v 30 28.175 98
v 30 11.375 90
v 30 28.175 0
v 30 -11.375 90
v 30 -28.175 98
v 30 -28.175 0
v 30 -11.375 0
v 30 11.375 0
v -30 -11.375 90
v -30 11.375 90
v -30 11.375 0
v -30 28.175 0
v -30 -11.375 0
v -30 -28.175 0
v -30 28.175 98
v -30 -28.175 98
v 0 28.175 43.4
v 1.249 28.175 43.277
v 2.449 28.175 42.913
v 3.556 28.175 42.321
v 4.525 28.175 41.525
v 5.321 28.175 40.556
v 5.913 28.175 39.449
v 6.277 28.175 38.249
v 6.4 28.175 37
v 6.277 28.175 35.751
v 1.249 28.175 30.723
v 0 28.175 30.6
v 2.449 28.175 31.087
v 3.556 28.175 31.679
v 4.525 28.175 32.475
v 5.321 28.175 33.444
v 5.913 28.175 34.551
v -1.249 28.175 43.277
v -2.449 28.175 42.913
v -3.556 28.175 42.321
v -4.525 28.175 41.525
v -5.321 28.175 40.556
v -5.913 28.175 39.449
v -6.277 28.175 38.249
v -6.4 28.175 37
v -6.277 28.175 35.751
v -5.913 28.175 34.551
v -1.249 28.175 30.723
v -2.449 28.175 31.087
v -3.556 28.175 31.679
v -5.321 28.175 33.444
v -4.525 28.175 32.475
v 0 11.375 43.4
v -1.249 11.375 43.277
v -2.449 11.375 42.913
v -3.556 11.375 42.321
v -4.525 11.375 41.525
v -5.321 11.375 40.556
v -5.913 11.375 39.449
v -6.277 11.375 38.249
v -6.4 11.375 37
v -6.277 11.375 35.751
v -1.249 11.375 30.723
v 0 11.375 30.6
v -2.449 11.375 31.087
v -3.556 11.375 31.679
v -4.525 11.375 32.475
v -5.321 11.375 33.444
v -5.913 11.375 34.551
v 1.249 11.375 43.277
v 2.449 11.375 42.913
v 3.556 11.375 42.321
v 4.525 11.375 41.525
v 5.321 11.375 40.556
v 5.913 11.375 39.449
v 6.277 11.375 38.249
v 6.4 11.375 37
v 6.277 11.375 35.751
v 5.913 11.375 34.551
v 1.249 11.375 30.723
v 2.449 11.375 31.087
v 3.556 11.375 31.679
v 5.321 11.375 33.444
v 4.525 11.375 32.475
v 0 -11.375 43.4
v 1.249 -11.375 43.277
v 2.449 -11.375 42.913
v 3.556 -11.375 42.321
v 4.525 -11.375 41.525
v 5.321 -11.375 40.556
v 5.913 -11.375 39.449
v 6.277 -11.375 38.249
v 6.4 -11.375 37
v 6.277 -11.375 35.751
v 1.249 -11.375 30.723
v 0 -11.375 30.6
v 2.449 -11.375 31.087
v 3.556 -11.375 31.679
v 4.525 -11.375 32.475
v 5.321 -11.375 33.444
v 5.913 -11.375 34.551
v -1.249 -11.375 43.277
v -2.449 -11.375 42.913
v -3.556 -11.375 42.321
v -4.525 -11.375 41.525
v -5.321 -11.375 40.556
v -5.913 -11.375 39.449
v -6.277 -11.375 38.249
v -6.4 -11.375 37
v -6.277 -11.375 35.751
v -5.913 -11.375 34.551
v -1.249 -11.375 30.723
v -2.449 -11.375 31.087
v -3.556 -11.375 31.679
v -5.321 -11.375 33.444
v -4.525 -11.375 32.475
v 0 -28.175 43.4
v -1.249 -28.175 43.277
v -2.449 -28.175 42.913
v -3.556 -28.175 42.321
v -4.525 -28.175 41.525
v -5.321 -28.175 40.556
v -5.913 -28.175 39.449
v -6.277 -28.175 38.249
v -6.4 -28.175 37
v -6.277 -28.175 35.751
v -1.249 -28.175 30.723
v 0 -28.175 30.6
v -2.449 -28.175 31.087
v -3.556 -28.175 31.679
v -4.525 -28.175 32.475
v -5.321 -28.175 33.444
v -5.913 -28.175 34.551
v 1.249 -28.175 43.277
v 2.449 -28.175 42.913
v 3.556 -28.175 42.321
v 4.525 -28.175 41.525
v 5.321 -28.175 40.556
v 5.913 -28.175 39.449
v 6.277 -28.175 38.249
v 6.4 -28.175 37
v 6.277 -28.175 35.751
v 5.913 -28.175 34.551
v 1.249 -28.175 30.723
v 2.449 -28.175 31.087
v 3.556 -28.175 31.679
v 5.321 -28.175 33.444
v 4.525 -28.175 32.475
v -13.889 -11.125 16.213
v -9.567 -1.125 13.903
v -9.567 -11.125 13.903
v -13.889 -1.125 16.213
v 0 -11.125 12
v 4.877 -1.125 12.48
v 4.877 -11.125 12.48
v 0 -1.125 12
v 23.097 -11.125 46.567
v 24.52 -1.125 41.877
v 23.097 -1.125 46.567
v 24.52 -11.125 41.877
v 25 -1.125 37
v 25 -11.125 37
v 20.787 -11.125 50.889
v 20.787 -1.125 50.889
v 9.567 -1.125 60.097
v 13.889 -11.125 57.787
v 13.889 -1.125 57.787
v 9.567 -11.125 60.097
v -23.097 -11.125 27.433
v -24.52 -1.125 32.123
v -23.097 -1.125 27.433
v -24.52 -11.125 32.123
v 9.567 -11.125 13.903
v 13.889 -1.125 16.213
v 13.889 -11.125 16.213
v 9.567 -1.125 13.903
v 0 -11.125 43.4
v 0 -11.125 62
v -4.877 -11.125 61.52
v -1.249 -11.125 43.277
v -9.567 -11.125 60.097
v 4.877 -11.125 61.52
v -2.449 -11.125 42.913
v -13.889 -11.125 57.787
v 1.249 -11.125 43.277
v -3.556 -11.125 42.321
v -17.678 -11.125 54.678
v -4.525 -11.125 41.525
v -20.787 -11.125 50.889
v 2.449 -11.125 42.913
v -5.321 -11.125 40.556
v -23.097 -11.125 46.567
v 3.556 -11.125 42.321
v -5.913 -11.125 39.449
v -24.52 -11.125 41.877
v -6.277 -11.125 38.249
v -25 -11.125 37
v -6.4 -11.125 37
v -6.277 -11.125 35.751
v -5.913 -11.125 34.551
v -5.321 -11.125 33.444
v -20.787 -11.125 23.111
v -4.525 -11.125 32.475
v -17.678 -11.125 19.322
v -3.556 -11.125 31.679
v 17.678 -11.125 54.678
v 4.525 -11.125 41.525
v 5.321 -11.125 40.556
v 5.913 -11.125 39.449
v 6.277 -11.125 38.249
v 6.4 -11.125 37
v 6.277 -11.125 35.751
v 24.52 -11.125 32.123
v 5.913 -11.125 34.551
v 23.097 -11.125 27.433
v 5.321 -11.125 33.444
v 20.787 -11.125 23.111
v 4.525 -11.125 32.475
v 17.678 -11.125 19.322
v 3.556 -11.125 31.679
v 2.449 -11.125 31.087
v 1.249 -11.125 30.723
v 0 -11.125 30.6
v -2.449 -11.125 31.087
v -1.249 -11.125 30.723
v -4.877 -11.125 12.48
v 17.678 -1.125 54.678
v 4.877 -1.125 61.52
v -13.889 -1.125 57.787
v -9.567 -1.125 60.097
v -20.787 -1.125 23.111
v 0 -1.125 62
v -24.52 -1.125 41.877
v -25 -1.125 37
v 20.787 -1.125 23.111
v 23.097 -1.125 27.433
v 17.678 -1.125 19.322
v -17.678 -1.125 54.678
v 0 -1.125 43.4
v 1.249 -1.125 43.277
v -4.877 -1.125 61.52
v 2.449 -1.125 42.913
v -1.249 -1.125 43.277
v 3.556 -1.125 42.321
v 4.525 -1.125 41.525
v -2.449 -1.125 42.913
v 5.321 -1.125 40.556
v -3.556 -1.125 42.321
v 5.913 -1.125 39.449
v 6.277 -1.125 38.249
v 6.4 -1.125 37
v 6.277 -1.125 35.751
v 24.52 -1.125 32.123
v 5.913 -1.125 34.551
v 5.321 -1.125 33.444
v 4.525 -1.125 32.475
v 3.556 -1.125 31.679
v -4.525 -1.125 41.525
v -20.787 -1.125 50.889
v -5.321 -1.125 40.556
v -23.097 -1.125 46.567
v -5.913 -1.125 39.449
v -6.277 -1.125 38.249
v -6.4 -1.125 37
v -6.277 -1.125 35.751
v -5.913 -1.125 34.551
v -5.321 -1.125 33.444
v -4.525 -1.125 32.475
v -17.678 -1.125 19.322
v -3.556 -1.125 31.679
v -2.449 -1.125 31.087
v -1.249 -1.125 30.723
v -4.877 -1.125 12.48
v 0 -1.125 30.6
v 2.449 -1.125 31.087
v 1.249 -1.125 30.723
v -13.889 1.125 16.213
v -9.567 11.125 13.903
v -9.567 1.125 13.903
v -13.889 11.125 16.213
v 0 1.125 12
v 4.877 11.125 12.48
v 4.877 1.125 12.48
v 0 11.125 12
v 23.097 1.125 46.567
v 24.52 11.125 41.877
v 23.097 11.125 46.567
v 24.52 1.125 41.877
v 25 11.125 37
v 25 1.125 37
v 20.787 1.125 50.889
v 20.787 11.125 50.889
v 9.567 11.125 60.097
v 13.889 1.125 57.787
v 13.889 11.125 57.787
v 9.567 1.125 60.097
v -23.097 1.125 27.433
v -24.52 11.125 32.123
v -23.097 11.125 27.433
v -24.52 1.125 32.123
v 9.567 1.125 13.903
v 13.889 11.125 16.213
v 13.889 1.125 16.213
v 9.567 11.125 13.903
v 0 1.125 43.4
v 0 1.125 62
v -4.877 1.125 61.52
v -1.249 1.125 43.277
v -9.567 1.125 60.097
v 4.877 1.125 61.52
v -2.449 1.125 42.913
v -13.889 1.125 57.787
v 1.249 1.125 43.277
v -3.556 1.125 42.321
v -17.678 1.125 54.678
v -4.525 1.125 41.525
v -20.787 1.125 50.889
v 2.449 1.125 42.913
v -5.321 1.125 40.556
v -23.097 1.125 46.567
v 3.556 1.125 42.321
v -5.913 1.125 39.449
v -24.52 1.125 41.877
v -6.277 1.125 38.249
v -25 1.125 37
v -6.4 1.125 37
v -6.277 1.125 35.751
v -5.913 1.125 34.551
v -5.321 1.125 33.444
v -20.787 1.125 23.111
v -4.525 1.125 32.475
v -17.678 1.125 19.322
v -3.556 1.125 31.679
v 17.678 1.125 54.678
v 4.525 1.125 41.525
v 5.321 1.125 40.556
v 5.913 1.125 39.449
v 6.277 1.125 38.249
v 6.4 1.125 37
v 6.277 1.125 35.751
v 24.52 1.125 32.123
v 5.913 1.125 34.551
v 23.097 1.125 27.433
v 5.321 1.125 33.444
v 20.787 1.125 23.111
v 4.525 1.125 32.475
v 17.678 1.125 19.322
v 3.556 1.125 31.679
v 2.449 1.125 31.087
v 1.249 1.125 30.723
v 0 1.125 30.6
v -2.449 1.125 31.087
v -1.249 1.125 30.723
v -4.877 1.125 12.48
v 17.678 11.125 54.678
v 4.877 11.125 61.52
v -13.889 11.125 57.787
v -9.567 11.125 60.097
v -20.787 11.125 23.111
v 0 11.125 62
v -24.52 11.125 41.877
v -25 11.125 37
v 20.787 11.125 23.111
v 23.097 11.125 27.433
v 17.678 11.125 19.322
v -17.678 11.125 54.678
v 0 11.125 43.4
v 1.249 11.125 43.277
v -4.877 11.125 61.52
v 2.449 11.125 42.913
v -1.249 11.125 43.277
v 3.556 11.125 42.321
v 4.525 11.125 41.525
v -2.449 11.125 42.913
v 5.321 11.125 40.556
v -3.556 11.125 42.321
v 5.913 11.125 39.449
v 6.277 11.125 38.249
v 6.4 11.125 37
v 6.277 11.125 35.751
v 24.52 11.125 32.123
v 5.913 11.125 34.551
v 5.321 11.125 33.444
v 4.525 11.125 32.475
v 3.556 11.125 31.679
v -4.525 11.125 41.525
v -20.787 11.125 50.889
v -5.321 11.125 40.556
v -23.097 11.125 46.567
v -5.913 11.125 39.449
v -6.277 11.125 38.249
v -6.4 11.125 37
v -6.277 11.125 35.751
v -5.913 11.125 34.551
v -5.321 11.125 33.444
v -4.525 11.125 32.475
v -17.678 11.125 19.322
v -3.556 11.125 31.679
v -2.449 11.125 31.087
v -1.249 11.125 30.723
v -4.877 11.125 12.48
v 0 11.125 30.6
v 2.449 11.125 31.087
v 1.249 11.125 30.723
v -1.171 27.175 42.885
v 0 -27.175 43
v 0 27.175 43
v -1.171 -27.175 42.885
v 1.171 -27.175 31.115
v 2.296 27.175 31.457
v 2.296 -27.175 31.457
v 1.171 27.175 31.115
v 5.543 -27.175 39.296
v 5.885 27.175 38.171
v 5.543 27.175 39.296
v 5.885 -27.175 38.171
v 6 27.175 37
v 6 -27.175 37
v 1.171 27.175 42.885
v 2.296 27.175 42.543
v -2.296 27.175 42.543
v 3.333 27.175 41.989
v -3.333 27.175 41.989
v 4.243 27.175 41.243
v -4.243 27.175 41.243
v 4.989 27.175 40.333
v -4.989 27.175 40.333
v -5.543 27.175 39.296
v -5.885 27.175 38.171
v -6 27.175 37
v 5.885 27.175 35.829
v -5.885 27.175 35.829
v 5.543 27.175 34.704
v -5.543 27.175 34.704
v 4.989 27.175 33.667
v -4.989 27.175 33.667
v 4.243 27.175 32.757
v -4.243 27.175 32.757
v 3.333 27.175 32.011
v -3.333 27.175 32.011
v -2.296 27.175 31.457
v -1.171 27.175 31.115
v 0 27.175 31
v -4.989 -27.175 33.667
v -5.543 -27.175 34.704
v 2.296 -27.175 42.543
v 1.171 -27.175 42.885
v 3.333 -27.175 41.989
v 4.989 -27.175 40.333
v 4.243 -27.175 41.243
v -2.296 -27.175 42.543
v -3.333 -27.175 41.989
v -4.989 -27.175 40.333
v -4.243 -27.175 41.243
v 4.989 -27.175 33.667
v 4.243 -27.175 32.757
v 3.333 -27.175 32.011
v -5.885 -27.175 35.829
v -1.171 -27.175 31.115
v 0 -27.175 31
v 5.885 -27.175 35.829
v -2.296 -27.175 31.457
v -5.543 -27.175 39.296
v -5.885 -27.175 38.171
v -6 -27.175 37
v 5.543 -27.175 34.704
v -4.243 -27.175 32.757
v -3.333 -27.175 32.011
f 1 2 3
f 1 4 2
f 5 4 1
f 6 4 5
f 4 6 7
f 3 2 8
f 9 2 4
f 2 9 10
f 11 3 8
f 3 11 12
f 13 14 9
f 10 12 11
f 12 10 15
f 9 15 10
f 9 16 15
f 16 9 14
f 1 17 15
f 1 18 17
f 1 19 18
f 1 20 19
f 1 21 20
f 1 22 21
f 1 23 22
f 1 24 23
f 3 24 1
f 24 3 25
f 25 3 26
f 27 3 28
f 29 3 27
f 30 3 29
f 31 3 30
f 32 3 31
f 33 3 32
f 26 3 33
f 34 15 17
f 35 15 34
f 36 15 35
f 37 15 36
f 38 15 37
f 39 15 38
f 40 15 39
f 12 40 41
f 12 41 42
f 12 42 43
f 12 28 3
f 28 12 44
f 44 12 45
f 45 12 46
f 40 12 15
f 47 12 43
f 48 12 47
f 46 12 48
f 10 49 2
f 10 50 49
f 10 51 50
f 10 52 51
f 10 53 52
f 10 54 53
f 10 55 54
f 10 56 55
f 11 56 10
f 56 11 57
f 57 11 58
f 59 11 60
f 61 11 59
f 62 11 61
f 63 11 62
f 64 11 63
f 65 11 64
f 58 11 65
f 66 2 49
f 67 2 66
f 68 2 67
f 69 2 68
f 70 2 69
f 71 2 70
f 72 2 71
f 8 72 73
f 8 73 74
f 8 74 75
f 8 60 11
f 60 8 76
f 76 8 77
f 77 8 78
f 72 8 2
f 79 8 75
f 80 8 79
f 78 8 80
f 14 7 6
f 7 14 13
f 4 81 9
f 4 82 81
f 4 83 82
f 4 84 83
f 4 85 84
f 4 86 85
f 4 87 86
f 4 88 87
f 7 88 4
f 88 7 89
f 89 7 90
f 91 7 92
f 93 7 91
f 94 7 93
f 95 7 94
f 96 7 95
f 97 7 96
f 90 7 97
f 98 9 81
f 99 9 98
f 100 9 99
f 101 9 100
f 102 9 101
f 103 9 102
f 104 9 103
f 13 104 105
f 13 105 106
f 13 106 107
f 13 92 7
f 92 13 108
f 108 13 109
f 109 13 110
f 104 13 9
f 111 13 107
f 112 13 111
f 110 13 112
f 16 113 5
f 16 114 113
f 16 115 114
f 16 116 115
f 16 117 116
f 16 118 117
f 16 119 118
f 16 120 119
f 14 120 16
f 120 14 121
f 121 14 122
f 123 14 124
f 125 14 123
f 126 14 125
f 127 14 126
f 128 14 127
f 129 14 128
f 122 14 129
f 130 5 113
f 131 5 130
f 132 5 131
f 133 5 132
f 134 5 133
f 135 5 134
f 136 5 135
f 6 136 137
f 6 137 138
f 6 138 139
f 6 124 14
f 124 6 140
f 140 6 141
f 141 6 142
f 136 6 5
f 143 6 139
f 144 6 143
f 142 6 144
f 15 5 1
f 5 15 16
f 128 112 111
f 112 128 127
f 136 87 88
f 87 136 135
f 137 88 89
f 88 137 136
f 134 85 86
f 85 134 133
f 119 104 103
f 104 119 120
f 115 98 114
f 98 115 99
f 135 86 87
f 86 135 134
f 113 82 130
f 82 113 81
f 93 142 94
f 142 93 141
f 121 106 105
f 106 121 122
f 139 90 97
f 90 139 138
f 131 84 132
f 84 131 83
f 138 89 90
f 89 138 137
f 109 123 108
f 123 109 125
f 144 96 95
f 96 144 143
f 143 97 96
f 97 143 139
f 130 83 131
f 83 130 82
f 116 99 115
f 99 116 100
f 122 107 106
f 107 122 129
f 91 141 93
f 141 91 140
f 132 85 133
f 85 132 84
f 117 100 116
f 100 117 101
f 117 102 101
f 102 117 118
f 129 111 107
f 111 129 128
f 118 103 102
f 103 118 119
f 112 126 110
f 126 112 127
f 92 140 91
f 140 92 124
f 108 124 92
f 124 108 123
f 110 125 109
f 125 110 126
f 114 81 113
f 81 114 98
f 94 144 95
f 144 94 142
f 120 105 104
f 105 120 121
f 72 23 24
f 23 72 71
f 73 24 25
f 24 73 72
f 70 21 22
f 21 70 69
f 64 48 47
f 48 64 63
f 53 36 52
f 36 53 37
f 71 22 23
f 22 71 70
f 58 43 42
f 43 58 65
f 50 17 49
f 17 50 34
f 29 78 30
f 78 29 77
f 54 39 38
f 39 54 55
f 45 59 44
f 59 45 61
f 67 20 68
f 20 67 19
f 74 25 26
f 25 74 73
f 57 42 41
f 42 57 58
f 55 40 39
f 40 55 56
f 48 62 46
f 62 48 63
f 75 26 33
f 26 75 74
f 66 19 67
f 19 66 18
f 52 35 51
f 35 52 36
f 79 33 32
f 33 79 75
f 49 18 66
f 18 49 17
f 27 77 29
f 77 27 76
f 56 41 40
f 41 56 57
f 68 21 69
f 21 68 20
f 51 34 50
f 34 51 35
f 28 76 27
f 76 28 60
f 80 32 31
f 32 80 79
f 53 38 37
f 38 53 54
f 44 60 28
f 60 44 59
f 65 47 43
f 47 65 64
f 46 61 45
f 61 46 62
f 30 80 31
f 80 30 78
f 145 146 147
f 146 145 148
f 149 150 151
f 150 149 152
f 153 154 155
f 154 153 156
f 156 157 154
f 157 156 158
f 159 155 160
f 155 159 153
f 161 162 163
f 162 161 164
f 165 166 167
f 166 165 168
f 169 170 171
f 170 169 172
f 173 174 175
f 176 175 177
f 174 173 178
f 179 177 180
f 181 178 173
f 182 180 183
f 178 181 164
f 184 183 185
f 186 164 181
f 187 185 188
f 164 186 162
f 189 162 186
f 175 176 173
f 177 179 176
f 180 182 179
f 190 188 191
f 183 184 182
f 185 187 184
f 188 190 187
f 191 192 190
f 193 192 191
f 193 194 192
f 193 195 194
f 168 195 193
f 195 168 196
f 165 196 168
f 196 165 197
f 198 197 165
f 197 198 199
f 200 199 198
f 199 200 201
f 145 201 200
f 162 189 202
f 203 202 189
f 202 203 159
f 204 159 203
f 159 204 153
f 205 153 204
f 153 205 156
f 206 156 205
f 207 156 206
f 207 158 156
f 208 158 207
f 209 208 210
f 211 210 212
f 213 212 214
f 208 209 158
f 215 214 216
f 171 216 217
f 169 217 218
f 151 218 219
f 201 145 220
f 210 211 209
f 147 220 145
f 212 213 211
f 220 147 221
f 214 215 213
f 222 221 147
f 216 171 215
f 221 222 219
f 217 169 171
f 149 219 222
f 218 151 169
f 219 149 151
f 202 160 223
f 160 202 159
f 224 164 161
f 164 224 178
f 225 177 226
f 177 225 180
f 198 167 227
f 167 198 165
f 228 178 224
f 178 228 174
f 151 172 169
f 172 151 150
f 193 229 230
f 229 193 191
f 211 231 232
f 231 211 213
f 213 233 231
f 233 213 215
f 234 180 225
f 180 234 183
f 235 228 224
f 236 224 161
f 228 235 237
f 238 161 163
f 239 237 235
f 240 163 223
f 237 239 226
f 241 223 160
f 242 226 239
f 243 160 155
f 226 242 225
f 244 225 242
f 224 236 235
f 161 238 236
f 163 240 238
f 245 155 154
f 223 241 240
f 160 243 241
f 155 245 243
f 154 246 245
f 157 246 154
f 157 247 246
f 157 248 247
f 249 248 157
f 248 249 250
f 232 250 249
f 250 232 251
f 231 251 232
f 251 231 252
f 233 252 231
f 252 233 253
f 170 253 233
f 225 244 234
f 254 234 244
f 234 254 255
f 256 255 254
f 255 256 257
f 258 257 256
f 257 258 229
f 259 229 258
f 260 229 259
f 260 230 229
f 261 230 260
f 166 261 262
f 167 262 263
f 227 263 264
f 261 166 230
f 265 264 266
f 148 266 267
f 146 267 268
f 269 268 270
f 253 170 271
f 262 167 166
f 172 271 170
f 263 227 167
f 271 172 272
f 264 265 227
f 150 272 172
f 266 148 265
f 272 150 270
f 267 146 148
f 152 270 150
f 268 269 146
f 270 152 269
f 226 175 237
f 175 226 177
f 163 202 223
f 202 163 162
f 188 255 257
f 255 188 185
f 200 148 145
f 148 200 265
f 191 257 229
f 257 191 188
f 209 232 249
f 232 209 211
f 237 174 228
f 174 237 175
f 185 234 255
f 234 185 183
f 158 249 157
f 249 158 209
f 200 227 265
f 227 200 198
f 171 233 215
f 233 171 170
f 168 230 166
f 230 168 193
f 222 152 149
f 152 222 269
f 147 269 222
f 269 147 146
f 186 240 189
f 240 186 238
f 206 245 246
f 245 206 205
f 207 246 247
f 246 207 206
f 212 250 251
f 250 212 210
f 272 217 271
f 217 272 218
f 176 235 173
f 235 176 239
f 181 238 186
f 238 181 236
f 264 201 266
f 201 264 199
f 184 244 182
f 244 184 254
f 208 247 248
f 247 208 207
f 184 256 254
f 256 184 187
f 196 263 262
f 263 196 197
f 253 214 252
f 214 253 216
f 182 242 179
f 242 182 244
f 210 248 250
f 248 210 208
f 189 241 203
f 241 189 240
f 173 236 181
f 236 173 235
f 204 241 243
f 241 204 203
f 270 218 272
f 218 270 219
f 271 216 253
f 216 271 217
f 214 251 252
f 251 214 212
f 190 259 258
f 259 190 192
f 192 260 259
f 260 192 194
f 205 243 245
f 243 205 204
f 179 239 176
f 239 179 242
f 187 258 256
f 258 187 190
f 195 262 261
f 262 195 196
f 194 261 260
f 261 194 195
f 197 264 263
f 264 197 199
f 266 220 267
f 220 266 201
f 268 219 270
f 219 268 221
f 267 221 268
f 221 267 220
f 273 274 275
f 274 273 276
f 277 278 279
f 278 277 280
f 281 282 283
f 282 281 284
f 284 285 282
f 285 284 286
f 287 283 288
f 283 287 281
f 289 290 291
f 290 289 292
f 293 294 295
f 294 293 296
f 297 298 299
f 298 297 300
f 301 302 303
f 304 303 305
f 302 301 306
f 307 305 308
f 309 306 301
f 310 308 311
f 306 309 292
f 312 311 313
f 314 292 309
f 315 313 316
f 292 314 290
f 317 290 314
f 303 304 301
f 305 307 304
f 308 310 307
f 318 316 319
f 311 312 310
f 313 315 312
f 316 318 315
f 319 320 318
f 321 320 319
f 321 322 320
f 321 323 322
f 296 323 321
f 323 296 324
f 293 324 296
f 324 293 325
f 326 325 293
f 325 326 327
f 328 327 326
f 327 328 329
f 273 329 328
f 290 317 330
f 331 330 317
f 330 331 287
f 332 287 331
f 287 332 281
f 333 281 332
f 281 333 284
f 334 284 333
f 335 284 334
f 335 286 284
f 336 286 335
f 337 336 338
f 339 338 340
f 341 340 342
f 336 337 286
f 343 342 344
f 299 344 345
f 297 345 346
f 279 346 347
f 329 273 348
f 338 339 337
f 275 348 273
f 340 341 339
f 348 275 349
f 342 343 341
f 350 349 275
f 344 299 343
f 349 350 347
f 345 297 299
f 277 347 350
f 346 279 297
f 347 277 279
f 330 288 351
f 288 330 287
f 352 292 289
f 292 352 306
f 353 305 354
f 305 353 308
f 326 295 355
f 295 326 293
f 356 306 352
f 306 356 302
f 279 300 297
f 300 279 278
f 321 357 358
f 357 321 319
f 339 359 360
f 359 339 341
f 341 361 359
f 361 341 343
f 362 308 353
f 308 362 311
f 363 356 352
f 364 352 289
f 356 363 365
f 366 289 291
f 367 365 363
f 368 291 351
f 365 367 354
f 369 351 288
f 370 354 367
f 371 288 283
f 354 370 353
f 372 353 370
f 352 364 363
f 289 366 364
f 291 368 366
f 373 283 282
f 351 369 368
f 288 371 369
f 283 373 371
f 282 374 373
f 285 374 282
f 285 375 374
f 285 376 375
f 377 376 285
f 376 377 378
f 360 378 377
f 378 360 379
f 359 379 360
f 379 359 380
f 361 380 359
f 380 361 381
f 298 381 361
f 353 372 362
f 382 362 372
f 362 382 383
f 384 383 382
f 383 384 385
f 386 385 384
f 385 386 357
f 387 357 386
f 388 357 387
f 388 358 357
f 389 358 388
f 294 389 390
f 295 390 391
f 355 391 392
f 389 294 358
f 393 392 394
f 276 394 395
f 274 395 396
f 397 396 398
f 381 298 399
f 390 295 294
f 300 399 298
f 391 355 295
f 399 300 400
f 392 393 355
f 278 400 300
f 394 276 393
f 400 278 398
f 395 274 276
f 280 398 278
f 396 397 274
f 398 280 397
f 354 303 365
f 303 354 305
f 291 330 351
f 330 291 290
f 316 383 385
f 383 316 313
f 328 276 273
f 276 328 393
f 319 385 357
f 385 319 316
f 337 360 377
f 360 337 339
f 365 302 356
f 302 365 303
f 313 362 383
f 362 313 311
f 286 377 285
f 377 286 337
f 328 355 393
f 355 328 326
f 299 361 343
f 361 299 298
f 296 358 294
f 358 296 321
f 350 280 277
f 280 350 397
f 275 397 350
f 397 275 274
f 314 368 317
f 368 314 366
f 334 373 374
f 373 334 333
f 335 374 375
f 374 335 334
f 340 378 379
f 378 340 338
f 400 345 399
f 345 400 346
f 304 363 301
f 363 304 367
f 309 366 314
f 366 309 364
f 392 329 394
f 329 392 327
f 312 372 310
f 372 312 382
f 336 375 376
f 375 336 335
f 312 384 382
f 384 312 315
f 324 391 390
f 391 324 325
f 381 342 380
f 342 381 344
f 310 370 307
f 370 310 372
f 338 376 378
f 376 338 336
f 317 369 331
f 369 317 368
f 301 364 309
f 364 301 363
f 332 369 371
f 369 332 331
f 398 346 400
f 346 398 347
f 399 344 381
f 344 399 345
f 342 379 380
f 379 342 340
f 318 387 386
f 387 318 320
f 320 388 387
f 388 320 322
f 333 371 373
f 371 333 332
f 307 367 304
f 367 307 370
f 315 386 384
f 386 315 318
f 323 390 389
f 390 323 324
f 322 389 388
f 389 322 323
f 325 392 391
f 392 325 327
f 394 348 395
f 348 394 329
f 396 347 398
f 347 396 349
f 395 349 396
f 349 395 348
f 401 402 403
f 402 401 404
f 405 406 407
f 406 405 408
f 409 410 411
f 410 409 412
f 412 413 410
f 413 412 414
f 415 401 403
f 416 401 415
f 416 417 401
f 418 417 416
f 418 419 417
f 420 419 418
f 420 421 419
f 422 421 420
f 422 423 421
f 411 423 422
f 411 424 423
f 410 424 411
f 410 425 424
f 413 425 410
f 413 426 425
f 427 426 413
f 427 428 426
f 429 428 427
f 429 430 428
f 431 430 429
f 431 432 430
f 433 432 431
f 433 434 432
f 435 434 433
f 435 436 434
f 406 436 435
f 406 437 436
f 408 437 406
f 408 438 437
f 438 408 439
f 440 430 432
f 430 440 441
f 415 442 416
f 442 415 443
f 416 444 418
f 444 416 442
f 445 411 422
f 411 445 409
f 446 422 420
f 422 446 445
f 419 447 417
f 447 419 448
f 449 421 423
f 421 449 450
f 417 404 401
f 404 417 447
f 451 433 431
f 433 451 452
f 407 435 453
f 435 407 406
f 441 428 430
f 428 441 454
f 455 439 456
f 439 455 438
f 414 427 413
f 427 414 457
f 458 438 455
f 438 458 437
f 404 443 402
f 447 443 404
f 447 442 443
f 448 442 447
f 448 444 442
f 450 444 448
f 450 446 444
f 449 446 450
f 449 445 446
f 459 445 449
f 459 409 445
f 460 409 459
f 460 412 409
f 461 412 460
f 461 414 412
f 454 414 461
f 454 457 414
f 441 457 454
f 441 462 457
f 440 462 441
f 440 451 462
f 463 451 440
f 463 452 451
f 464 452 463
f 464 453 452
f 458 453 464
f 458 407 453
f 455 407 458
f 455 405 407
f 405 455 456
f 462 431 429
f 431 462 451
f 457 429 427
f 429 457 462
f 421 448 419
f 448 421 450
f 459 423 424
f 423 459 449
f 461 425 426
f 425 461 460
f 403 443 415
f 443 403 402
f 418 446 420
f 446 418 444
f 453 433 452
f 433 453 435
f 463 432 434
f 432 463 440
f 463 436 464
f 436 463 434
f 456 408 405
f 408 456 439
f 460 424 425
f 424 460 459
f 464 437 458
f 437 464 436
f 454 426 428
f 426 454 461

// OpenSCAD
$fn = 32;

// ------------------------------------------------------------------------
// Trolley wheel set: wheels d50, fork 90 mm tall
// Every part is its own module, assembly() places every instance.
// ------------------------------------------------------------------------

// --- part 1 ---
module trolley_fork() {
  difference() {
    union() {
      translate([-30, 11.375, 0]) cube([60, 16.8, 90]);
      translate([-30, -28.175, 0]) cube([60, 16.8, 90]);
      translate([-30, -28.175, 90]) cube([60, 56.35, 8]);
    }
    translate([0, -19.775, 37]) rotate([90, 0, 0]) cylinder(h = 18.8, d = 12.8, center = true);
    translate([0, 19.775, 37]) rotate([90, 0, 0]) cylinder(h = 18.8, d = 12.8, center = true);
  }
}

// --- part 2 ---
module trolley_wheel() {
  difference() {
      translate([0, 0, 0]) cylinder(h = 10, d = 50);
      translate([0, 0, -1]) cylinder(h = 12, d = 12.8);
    }
}

// --- part 3 ---
module trolley_axle() {
  translate([0, 0, -27.175]) cylinder(h = 54.35, d = 12);
}

// --- assembly ---
module assembly() {
  color([0.80, 0.24, 0.20]) translate([0, 0, 0]) rotate([0, 0, 0]) trolley_fork();
  color([0.20, 0.45, 0.75]) translate([0, -1.125, 37]) rotate([90, 0, 0]) trolley_wheel();
  color([0.25, 0.62, 0.32]) translate([0, 11.125, 37]) rotate([90, 0, 0]) trolley_wheel();
  color([0.92, 0.70, 0.18]) translate([0, 0, 37]) rotate([90, 0, 0]) trolley_axle();
}

assembly();
